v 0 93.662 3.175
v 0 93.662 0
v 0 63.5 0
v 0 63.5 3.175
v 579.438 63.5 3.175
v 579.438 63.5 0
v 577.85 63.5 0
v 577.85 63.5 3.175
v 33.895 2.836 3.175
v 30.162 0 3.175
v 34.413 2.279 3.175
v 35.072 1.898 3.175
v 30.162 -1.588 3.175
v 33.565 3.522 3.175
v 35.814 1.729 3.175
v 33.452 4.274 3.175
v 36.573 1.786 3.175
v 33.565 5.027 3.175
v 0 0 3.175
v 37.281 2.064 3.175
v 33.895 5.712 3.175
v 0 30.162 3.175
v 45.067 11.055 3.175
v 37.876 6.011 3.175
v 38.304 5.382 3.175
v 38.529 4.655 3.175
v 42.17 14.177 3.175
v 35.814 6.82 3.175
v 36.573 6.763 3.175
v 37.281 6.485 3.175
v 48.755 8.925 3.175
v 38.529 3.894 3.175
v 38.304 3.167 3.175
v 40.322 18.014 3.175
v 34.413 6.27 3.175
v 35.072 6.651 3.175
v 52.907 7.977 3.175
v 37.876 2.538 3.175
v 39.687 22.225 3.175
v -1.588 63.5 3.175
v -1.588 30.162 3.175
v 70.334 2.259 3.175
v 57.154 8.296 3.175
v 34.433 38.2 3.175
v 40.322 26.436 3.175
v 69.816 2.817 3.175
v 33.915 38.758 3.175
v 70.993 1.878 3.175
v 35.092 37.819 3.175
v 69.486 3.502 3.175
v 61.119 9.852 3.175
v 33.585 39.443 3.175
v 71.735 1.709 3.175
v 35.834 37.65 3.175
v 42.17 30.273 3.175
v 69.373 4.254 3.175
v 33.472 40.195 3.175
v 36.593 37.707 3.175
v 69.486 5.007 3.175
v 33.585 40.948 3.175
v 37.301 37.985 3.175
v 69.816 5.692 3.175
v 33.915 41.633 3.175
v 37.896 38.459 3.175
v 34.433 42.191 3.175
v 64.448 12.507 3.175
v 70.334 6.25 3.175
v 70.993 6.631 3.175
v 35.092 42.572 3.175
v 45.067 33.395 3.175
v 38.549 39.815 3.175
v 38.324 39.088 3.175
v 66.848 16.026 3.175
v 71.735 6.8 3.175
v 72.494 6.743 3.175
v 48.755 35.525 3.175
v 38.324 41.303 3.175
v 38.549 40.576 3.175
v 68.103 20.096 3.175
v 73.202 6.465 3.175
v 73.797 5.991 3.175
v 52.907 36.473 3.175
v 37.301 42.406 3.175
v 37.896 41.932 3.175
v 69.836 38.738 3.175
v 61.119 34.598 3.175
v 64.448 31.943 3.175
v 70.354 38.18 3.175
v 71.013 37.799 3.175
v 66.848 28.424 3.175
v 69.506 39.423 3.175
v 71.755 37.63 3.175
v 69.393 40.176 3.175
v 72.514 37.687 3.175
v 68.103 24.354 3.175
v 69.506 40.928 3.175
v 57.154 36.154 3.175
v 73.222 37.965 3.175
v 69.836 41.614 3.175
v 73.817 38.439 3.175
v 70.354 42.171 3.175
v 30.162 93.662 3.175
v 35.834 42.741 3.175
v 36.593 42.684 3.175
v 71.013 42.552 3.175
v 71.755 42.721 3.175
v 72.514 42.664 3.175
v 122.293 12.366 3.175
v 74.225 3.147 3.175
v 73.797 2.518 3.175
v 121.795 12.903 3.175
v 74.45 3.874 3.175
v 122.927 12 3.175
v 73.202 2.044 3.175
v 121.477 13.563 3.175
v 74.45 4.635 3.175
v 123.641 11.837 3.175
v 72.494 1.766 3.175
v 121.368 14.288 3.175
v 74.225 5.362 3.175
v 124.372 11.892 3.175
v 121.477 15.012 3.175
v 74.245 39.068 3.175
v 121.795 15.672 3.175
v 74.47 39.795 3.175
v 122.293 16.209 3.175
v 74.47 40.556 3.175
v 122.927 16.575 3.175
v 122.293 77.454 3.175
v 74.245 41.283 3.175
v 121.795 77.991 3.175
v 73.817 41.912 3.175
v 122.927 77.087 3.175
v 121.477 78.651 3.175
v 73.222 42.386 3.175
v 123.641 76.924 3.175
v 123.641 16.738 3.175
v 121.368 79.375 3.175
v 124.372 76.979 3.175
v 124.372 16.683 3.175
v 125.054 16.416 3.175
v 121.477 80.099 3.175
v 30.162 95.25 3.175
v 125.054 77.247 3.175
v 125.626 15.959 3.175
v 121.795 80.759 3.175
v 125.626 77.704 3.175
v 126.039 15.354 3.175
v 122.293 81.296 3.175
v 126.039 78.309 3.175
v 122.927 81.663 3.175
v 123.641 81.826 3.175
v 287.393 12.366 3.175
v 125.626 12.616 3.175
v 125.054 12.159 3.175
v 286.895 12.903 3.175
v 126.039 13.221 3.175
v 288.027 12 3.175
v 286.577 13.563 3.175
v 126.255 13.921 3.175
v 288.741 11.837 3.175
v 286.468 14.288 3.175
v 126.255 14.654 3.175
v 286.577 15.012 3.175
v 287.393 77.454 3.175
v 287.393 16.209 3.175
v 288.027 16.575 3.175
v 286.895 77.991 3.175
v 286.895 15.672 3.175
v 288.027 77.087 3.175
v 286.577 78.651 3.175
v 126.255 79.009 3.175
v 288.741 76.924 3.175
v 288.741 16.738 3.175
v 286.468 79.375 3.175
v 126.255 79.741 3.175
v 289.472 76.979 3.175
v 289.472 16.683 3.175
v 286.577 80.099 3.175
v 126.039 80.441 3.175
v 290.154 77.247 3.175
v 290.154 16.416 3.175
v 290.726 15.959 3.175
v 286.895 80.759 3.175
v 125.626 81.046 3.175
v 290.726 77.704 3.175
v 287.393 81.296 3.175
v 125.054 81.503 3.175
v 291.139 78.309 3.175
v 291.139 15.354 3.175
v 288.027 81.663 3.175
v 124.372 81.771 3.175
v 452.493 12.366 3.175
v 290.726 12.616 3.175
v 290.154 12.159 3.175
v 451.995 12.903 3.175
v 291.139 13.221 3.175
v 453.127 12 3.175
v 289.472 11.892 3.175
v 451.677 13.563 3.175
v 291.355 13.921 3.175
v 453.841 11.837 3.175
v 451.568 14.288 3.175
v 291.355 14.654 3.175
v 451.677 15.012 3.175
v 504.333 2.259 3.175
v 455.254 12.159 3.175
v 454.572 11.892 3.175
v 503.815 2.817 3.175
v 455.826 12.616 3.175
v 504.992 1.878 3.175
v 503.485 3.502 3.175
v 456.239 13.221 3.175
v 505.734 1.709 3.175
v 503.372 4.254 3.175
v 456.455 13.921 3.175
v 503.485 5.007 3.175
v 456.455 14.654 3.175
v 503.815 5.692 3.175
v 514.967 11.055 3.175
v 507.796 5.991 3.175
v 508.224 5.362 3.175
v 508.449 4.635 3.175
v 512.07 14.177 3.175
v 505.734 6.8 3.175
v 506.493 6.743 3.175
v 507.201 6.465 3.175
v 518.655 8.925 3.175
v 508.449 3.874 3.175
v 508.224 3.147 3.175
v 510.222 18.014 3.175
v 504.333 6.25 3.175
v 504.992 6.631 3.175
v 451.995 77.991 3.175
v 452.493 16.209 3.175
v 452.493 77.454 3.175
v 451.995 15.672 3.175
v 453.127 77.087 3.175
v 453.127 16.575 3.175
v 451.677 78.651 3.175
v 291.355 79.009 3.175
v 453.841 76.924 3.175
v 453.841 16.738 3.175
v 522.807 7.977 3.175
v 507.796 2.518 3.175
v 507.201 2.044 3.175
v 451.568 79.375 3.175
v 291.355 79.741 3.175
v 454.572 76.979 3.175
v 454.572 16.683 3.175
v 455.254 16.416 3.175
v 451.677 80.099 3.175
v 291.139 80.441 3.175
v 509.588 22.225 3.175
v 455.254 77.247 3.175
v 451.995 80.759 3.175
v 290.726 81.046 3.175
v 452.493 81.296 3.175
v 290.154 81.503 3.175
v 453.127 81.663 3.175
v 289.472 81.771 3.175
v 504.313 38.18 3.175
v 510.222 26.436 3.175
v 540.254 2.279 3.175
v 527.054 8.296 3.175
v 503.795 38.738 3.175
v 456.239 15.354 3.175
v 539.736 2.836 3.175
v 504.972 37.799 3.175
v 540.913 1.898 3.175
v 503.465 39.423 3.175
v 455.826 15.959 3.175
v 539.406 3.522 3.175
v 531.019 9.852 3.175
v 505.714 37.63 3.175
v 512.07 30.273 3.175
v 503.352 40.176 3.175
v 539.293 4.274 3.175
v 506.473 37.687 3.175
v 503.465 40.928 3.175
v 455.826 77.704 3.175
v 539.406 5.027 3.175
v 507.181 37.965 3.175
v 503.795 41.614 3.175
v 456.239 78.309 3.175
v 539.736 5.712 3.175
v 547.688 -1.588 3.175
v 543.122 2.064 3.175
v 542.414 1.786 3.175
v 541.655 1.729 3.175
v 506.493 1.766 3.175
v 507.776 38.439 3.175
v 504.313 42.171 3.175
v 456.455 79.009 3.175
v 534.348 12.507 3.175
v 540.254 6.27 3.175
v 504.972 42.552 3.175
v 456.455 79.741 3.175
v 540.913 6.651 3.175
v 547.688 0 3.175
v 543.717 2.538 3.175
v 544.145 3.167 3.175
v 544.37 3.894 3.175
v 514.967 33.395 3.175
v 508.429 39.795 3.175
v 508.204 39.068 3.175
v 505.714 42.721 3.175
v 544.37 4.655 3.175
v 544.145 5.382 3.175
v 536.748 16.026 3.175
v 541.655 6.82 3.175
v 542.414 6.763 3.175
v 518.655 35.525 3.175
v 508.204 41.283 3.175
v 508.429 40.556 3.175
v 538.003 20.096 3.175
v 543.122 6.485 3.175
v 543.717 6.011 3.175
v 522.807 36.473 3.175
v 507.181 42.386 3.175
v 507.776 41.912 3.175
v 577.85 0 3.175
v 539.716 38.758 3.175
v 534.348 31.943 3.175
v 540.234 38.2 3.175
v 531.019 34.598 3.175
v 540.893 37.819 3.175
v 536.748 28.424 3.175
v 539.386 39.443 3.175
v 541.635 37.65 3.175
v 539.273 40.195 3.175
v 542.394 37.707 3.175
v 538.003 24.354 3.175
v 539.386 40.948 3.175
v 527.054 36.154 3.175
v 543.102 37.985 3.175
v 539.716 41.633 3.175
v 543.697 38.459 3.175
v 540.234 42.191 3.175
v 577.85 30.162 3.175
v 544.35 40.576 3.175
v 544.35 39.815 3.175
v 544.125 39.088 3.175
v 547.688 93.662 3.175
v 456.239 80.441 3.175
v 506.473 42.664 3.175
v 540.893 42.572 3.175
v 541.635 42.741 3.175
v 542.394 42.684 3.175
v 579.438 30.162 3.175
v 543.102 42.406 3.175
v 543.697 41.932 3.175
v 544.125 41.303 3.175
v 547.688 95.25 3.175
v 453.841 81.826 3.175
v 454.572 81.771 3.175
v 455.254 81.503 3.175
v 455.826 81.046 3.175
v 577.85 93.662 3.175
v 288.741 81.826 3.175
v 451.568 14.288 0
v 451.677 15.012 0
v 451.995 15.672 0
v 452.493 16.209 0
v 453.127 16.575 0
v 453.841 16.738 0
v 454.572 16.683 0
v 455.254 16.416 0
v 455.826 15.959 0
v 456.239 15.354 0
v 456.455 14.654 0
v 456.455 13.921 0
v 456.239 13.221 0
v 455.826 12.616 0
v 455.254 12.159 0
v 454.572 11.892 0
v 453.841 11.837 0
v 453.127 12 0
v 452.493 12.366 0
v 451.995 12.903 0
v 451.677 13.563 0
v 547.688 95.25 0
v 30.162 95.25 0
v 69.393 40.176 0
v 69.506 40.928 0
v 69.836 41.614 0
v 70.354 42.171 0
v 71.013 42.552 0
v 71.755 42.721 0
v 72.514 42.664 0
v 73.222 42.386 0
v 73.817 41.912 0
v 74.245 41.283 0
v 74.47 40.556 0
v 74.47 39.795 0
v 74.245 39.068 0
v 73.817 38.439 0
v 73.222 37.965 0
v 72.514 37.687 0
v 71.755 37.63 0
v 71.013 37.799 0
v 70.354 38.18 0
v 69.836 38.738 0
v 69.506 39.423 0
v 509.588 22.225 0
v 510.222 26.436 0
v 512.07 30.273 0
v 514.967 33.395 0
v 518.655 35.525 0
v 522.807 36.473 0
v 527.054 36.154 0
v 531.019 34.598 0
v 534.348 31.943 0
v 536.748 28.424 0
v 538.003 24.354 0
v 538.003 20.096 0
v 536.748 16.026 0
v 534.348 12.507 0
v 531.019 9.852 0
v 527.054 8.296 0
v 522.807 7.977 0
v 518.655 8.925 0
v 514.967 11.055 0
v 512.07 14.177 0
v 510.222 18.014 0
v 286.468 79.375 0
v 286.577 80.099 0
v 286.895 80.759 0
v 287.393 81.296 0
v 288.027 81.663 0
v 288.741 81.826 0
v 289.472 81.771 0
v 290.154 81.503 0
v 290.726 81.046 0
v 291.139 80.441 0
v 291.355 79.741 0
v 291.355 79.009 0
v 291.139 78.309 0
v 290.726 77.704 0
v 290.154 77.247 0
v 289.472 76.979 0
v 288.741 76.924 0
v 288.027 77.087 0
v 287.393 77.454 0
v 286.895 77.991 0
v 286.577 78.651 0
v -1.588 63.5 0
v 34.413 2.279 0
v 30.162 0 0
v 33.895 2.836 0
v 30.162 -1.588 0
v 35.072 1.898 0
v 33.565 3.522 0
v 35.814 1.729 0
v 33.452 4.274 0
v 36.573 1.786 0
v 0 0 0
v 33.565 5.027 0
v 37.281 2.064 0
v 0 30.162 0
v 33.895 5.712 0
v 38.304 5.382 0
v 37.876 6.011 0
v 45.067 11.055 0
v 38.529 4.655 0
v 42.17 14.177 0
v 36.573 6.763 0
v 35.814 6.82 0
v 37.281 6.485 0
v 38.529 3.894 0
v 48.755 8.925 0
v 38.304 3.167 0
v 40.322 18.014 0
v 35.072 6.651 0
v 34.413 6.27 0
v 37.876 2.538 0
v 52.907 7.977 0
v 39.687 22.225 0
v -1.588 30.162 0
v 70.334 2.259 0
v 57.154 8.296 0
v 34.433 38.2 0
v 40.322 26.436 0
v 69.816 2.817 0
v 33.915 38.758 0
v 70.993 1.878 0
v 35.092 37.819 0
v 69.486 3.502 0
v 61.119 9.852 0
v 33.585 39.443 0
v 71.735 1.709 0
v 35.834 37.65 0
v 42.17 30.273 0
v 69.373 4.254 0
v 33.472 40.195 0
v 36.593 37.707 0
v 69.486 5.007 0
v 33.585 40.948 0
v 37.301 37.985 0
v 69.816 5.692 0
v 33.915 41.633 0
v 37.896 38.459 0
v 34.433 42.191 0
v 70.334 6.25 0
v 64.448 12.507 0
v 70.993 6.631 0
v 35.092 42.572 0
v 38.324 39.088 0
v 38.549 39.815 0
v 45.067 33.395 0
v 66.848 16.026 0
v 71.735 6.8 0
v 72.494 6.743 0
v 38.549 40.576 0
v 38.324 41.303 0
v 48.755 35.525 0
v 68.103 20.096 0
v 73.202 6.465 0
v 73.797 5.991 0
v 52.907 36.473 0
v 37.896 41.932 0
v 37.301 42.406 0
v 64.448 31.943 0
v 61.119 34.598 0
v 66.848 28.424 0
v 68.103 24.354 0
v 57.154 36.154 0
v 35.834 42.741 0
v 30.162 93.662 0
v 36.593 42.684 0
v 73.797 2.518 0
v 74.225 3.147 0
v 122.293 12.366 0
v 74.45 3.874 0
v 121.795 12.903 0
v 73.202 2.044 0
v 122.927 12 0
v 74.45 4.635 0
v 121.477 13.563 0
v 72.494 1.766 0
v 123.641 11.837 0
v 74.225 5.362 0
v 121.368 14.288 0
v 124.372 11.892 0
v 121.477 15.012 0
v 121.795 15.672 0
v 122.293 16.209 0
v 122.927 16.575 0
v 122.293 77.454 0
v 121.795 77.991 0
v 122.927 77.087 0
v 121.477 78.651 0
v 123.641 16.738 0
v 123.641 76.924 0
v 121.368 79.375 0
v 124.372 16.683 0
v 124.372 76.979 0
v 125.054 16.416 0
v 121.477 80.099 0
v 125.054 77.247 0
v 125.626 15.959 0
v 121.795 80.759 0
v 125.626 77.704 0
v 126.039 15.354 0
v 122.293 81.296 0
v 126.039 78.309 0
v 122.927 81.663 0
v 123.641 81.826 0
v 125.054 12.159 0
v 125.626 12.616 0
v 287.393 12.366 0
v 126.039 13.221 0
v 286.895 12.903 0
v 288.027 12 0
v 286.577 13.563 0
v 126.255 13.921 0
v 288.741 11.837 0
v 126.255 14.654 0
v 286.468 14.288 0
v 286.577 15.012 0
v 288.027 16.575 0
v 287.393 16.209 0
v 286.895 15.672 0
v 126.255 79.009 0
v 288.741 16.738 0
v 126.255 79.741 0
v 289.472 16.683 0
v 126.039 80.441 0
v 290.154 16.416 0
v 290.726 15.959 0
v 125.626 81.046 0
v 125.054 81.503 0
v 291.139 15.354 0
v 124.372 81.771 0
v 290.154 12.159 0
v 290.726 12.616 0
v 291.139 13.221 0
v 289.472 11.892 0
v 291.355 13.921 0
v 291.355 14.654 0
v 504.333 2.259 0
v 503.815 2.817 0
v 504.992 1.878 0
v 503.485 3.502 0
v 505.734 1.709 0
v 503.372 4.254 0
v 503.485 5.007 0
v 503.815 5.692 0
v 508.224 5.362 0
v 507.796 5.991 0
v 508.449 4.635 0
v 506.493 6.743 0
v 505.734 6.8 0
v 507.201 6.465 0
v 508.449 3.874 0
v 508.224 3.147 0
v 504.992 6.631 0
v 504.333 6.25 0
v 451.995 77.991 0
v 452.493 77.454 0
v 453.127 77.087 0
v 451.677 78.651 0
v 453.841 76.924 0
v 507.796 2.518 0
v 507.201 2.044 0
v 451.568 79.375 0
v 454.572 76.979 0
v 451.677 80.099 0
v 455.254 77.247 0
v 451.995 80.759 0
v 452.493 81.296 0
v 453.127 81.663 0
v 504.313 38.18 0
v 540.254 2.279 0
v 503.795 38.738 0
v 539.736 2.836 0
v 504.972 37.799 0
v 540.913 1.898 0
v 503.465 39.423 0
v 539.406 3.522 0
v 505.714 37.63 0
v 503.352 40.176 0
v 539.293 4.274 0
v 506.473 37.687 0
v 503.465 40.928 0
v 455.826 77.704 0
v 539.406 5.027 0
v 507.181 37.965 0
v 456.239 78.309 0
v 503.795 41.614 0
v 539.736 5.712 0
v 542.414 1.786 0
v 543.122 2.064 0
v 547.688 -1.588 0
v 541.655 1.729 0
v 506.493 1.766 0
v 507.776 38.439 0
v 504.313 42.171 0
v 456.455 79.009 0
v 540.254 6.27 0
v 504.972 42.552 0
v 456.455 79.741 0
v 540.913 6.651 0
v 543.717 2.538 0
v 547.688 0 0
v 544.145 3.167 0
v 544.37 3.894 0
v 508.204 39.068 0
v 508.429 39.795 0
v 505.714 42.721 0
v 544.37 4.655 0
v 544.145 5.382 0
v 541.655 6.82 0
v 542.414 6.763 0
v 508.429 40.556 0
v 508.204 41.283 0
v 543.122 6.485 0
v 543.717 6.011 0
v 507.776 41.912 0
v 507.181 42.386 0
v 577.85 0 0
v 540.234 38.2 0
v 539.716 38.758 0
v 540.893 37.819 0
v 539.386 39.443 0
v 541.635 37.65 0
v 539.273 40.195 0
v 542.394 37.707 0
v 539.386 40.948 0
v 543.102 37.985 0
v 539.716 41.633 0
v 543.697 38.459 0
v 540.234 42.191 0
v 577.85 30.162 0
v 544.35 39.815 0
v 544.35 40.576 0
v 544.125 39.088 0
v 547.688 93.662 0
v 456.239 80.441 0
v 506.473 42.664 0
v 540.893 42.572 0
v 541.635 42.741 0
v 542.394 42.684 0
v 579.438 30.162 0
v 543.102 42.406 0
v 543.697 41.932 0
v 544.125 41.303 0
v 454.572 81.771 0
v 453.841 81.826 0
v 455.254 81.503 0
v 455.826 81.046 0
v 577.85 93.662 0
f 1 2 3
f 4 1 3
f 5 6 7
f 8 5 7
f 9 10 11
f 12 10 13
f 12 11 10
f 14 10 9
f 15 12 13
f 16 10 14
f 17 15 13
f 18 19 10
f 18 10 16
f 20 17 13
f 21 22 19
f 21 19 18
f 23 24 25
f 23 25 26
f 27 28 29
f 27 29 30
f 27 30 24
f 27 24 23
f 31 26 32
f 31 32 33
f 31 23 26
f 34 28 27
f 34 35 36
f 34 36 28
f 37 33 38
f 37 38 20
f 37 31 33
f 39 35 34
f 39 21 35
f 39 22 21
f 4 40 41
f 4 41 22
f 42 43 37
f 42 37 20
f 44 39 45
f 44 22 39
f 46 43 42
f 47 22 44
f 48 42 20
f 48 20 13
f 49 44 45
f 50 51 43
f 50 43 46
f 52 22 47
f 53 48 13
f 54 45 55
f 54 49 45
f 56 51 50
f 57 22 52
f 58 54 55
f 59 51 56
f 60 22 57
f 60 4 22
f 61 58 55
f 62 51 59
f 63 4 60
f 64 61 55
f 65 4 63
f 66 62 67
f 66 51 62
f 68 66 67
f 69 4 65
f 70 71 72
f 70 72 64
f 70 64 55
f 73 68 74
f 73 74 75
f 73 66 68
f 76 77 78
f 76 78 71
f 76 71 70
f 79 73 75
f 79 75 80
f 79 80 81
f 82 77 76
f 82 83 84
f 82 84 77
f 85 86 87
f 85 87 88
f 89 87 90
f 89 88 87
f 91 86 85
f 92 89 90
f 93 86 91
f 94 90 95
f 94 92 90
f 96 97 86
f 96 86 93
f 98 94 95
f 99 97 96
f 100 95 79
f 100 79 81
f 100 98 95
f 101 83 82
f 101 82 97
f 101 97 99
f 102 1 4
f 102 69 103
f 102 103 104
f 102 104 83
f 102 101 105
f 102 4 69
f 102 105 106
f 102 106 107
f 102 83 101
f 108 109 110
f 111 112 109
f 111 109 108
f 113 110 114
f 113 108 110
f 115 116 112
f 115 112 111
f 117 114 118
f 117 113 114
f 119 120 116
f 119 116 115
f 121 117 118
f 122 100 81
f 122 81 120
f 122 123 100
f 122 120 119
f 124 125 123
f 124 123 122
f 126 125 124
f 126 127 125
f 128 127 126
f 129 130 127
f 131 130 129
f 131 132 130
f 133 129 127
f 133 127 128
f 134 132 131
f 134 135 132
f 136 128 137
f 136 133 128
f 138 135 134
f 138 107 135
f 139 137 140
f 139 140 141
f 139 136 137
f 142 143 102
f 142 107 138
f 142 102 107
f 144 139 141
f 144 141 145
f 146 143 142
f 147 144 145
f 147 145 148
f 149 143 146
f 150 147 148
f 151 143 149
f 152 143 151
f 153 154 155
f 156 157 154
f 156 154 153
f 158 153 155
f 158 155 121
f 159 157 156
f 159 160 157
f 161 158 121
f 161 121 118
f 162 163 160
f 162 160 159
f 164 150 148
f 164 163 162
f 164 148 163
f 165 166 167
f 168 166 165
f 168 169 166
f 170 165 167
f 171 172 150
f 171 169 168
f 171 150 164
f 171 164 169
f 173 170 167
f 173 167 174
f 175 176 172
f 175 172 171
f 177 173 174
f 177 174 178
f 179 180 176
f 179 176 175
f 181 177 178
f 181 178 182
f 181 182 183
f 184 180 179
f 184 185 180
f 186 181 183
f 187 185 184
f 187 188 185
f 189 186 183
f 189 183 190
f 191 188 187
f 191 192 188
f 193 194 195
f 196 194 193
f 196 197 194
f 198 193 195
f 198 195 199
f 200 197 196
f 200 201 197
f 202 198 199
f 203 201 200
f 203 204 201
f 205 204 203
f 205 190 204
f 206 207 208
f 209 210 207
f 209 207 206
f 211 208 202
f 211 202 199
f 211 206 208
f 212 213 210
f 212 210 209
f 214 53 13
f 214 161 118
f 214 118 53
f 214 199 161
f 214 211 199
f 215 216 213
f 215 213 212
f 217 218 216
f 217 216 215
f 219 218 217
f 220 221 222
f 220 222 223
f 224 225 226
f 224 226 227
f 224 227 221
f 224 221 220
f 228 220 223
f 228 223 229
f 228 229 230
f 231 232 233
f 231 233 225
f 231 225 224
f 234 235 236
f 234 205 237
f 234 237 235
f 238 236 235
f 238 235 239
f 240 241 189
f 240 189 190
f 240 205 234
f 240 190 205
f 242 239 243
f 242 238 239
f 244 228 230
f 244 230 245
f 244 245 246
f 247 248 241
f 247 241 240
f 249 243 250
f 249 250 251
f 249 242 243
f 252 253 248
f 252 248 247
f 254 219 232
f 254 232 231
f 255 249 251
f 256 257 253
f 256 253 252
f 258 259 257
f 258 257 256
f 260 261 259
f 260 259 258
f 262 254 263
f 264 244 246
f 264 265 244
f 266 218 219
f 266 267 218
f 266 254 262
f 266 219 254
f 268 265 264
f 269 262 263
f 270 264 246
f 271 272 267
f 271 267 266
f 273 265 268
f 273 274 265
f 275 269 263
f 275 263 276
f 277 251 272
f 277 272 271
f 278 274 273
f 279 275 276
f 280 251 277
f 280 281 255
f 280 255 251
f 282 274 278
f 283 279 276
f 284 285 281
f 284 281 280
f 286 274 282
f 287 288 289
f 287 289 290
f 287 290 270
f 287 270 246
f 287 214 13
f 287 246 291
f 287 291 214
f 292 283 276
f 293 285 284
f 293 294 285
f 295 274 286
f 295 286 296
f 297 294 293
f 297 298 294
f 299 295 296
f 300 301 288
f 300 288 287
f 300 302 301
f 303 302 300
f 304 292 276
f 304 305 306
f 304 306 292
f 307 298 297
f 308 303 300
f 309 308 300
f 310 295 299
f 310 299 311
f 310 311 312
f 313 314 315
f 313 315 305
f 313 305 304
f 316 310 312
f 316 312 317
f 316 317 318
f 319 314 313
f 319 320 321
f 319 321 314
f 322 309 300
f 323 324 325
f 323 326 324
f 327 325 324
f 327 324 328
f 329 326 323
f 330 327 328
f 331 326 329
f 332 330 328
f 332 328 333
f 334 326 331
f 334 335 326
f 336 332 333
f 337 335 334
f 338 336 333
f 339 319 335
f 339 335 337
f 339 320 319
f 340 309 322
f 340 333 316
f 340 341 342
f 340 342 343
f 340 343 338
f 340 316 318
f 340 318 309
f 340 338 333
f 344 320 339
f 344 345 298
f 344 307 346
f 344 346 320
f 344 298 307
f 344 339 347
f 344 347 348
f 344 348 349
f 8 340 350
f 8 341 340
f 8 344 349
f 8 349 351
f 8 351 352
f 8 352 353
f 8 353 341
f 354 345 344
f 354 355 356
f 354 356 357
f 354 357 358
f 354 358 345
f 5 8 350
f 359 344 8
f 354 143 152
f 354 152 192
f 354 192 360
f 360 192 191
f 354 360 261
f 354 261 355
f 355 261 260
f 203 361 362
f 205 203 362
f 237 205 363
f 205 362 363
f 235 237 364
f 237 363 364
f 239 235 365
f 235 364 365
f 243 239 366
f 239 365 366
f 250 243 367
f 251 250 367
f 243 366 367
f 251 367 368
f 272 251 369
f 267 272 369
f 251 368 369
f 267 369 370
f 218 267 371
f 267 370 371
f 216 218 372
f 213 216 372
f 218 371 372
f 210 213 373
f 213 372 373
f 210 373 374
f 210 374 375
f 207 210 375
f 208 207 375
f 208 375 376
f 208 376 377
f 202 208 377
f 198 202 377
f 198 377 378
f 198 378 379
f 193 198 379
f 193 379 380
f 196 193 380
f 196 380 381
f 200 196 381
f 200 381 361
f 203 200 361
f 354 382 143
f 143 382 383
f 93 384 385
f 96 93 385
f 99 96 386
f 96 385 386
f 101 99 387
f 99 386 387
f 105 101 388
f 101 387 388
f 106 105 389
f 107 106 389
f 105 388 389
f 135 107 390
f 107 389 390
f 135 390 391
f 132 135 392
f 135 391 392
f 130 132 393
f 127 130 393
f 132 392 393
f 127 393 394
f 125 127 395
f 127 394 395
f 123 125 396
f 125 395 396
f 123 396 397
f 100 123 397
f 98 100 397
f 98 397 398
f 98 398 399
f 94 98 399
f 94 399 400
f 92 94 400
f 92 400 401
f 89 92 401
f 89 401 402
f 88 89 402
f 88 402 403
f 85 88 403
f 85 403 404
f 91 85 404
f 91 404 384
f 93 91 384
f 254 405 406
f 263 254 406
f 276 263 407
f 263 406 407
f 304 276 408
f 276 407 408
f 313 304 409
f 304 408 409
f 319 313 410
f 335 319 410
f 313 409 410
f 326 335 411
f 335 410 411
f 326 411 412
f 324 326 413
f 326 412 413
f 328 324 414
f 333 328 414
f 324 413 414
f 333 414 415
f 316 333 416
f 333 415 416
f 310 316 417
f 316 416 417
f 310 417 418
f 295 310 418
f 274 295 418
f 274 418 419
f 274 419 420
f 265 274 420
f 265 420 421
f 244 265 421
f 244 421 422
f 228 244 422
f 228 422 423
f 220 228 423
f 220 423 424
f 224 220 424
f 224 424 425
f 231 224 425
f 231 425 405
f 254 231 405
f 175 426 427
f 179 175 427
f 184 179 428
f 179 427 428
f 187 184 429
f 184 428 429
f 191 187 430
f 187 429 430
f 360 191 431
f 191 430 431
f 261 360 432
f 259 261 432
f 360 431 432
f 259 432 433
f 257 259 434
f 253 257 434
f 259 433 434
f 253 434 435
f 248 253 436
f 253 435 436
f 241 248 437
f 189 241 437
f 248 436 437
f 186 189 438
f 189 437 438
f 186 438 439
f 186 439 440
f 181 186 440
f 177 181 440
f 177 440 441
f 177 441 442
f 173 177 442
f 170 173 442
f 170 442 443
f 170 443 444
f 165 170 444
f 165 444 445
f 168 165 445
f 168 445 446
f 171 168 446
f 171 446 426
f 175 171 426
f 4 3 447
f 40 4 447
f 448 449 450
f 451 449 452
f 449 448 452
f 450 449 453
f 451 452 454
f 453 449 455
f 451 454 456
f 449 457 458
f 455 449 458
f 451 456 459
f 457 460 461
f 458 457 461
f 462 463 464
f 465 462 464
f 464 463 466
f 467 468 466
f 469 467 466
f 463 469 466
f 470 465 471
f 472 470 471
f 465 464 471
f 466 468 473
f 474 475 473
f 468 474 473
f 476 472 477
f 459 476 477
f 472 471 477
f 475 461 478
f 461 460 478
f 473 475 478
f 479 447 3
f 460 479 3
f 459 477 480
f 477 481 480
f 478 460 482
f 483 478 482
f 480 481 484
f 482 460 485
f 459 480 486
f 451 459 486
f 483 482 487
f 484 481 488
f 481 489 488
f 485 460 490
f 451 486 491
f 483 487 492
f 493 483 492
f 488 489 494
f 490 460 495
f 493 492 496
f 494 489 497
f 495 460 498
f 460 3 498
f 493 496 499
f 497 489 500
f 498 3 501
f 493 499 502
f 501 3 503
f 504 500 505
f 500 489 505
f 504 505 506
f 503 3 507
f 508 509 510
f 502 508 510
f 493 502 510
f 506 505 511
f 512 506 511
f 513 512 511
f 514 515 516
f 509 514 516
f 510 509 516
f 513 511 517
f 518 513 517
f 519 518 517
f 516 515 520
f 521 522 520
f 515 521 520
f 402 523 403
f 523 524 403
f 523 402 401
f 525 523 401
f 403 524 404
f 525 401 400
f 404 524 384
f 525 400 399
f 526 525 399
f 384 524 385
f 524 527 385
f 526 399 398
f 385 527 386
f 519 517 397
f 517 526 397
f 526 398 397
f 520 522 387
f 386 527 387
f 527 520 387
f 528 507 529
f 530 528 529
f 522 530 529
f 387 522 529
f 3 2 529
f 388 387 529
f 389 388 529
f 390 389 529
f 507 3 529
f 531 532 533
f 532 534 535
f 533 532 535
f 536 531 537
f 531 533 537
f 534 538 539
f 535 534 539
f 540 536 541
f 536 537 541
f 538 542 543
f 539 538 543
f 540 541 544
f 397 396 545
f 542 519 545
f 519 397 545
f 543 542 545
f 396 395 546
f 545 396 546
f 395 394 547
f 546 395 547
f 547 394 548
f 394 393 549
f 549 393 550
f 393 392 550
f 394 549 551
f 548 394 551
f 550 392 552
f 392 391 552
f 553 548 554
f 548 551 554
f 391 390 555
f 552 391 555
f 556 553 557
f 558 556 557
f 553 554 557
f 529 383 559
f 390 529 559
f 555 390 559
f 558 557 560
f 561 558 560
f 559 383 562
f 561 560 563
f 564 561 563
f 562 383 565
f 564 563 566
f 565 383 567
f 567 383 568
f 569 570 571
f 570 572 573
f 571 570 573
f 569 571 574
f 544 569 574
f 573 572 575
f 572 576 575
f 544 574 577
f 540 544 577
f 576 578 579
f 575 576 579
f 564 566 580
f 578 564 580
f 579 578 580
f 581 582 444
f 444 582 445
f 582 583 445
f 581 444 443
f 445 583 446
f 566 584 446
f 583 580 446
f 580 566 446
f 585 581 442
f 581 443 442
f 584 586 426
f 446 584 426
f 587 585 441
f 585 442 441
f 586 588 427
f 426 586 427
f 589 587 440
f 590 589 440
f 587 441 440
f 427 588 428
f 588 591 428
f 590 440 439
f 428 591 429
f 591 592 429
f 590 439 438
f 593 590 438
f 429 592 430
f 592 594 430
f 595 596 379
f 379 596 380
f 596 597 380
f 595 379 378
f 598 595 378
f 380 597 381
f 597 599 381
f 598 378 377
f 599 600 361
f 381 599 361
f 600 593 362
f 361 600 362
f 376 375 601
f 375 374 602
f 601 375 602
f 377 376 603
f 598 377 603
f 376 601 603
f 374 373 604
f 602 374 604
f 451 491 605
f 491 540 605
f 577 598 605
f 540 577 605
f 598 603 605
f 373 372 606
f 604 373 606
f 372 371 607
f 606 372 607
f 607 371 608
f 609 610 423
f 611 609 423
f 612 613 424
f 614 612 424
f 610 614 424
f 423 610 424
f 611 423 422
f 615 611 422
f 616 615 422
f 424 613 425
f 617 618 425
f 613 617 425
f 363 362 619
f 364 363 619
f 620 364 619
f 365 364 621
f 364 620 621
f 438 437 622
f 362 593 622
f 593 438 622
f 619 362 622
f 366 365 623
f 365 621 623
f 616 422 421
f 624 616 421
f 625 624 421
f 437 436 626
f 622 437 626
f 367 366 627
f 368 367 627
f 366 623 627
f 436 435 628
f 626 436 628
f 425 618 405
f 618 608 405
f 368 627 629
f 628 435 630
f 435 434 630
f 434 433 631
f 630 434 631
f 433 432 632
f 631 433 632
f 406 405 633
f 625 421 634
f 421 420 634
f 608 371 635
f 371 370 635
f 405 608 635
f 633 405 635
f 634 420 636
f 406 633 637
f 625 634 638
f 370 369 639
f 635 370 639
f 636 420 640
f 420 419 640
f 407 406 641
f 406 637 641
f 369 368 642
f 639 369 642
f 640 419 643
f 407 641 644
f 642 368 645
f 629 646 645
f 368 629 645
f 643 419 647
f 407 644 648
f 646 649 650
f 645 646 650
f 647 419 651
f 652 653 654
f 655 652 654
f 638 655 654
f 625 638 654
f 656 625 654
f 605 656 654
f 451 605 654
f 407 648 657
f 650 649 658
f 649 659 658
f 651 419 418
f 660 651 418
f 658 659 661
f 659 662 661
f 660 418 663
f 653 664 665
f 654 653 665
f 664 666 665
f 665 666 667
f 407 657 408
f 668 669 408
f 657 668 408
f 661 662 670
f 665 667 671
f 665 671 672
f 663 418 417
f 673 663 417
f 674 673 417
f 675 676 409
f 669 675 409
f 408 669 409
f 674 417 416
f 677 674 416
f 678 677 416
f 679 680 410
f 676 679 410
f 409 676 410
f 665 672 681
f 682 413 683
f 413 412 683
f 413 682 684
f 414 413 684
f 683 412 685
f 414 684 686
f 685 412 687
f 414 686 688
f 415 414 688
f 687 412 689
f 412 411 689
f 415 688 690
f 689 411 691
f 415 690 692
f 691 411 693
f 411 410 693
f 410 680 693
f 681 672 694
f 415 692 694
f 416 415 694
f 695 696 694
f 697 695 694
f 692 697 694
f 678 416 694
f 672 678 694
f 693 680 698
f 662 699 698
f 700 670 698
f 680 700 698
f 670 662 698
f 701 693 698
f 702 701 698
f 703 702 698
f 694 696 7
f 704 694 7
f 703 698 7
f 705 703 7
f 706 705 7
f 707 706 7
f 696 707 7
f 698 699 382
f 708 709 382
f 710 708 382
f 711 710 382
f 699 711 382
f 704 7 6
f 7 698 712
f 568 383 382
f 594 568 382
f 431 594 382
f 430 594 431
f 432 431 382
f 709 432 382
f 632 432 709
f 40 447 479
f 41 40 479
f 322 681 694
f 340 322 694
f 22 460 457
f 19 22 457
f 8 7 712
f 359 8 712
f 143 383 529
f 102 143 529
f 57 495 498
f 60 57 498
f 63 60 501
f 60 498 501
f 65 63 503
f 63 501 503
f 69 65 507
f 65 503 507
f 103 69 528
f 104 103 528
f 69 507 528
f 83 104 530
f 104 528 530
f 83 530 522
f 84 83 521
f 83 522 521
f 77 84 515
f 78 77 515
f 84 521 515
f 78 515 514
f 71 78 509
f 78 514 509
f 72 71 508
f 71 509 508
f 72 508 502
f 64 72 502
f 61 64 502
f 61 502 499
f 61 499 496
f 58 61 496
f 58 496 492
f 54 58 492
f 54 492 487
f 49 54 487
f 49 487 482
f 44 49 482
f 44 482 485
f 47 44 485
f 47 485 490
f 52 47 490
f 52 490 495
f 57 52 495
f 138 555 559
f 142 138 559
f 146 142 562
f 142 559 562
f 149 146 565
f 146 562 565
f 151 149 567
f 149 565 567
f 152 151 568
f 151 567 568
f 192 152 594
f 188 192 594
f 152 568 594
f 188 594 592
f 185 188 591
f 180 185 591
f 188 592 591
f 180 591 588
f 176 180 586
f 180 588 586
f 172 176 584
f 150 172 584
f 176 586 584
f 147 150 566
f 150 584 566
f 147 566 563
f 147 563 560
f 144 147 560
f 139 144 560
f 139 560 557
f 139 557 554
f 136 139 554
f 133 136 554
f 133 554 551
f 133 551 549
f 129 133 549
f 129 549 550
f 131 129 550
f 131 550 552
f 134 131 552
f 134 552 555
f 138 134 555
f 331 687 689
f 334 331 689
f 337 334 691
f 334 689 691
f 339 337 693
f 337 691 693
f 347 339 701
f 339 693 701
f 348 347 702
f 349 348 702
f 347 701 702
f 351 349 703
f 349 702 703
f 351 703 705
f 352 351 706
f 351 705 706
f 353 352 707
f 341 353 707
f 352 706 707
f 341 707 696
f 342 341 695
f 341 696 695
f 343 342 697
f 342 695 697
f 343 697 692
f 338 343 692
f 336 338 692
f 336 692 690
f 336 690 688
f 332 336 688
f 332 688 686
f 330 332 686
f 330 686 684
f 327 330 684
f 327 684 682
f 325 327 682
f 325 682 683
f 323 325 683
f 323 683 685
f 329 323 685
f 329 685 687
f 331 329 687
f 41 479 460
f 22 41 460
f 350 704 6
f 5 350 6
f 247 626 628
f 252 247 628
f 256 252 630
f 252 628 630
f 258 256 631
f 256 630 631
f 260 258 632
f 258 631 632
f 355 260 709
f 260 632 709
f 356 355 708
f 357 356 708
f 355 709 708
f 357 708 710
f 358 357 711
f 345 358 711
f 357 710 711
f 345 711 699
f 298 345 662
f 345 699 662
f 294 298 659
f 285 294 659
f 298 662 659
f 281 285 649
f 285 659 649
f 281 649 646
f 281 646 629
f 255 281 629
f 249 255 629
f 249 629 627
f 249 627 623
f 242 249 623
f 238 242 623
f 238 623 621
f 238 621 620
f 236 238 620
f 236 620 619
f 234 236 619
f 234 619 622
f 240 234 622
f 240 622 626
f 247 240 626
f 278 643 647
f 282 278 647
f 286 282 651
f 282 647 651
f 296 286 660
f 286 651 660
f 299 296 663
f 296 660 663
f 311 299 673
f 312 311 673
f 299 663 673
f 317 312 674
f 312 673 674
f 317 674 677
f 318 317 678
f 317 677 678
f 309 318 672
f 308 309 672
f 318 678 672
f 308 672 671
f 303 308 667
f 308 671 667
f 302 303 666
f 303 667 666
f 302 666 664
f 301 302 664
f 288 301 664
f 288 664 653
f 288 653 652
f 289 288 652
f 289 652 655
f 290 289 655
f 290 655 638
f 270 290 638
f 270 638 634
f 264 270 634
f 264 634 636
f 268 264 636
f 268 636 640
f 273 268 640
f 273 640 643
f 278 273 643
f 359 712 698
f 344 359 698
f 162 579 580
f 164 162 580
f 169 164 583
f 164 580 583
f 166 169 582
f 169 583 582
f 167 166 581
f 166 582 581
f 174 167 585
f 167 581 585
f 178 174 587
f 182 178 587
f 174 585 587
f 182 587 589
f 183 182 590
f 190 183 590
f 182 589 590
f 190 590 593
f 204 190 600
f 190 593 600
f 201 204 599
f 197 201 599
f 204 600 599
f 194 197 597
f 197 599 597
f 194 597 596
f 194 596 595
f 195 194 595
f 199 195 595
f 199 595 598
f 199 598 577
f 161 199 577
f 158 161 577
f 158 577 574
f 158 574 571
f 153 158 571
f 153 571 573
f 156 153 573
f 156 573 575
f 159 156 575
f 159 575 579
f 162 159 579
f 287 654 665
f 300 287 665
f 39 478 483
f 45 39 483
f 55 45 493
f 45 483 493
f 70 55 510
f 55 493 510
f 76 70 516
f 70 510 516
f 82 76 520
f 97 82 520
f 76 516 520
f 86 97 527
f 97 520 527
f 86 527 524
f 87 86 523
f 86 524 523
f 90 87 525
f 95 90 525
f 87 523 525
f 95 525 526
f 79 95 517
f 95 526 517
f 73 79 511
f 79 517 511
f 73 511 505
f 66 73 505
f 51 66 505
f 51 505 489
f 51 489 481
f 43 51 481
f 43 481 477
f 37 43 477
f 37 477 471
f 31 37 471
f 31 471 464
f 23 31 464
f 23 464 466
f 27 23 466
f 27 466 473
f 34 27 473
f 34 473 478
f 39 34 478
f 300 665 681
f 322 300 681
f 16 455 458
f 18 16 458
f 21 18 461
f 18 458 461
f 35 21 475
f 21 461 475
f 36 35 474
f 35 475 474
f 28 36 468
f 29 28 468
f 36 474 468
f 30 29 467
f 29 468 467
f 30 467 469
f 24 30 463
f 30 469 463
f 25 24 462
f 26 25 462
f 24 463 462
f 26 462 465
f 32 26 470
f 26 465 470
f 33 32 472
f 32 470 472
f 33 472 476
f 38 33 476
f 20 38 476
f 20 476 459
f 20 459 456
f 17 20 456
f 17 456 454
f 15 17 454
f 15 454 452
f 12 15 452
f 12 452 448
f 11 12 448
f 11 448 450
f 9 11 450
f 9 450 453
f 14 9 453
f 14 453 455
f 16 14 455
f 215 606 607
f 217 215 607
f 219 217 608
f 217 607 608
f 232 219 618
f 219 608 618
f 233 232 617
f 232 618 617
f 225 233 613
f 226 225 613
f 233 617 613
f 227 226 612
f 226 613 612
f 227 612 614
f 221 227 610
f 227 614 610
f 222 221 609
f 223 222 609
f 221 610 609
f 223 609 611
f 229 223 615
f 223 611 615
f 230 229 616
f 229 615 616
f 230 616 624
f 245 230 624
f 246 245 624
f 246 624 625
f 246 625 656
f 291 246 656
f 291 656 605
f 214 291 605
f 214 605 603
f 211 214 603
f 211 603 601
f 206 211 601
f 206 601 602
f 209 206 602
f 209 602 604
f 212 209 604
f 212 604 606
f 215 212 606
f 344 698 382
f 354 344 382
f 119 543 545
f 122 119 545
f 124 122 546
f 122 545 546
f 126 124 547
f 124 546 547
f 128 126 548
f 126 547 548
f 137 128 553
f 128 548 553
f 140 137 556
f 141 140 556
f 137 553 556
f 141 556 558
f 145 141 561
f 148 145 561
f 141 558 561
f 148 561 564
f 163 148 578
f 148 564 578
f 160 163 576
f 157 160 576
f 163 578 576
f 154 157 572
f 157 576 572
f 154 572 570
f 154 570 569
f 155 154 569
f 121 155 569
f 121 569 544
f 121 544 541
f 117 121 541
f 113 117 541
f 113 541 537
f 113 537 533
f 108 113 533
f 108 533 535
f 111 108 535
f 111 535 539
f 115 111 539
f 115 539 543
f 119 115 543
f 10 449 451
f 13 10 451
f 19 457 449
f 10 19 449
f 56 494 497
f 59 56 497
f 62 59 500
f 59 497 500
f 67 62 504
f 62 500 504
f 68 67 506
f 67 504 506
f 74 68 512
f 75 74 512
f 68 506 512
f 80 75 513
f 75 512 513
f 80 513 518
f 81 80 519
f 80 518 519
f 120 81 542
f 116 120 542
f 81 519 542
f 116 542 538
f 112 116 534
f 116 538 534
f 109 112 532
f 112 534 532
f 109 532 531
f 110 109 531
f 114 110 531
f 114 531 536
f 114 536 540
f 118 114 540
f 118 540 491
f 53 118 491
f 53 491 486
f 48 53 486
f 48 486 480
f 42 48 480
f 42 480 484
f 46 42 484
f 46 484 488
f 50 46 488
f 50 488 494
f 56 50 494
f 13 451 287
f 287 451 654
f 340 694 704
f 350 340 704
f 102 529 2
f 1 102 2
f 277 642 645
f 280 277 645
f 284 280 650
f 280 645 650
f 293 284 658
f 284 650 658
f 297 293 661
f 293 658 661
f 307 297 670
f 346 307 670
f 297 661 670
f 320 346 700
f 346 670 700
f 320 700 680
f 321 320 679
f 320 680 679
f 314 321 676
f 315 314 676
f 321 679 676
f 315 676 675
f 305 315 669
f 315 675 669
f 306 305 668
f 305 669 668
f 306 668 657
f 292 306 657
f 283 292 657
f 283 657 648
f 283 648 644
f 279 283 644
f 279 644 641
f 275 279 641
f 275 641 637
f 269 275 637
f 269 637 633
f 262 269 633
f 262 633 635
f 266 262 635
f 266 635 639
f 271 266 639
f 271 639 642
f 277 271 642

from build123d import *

# Parameters (mm, degrees)
BOSS_EXTRUDE1_DEPTH          = 3.175
F_10_0_1935_DIAMETER_HOLE2_D = 4.9149
SKETCH5_R                    = 2.5527
SKETCH5_R_2                  = 14.2875
CUT_EXTRUDE2_DEPTH           = 6.35


with BuildPart() as part:
    # Sketch2 → Boss-Extrude1 (new body)
    with BuildSketch(Plane.XY):
        Polygon((0, 63.5), (-1.5875, 63.5), (-1.5875, 30.1625), (0, 30.1625), (0, 0), (30.1625, 0), (30.1625, -1.5875), (547.6875, -1.5875), (547.6875, 0), (577.85, 0), (577.85, 30.1625), (579.4375, 30.1625), (579.4375, 63.5), (577.85, 63.5), (577.85, 93.6625), (547.6875, 93.6625), (547.6875, 95.25), (30.1625, 95.25), (30.1625, 93.6625), (0, 93.6625), align=None)
    extrude(amount=BOSS_EXTRUDE1_DEPTH)

    # #10 (0.1935) Diameter Hole2 (through all)
    with Locations(Plane.XY.offset(3.175)):
        with Locations((288.925, 79.375), (123.825, 79.375), (454.025, 79.375), (454.025, 14.2875), (123.825, 14.2875), (288.925, 14.2875)):
            Hole(F_10_0_1935_DIAMETER_HOLE2_D / 2)

    # Sketch5 → Cut-Extrude2 (cut)
    with BuildSketch(Plane(origin=(0, 0, 0), x_dir=(-1, 0, 0), z_dir=(0, 0, -1))):
        with Locations((-541.825524484, 40.195494446)):
            Circle(SKETCH5_R)
        with Locations((-505.92448107, 4.2545)):
            Circle(SKETCH5_R)
        with Locations((-523.875002777, 22.224997223)):
            Circle(SKETCH5_R_2)
        with Locations((-541.8455, 4.274475516)):
            Circle(SKETCH5_R)
        with Locations((-505.904505554, 40.17551893)):
            Circle(SKETCH5_R)
        with Locations((-71.945494446, 40.17551893)):
            Circle(SKETCH5_R)
        with Locations((-36.0045, 4.274475516)):
            Circle(SKETCH5_R)
        with Locations((-53.974997223, 22.224997223)):
            Circle(SKETCH5_R_2)
        with Locations((-71.92551893, 4.2545)):
            Circle(SKETCH5_R)
        with Locations((-36.024475516, 40.195494446)):
            Circle(SKETCH5_R)
    extrude(amount=-CUT_EXTRUDE2_DEPTH, mode=Mode.SUBTRACT)


solid = part.part
